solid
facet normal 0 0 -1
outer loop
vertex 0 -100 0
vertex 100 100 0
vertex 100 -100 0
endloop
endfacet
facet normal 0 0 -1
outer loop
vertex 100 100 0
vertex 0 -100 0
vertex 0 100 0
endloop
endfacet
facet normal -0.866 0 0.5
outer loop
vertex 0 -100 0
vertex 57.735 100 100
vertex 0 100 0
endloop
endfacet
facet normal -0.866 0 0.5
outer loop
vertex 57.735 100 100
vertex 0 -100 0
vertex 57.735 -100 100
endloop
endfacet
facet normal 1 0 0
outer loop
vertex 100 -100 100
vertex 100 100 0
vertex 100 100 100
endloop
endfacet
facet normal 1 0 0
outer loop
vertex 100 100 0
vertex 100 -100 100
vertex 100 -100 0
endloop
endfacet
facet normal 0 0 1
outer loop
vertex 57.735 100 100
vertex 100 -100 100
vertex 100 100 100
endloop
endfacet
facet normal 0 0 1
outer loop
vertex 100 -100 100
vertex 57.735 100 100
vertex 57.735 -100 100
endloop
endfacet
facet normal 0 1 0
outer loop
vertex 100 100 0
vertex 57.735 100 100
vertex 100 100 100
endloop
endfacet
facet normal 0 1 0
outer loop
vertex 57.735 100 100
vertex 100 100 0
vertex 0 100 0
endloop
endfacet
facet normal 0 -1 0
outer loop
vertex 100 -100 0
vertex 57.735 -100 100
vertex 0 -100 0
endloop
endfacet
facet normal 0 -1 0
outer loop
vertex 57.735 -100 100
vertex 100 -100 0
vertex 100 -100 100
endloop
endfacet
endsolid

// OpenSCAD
// file: config.scad
$fa = $preview ? 12 : 1;
$fs = $preview ? 2 : 0.4;

choc_key_x = 18;
choc_key_y = 17;
pcbAndHotswapThikness = 3;
caseThikness = 2.5;
wallOffsetFromPcb = 1;
wallOffsetFromConnector = 3;
tentingAngle = 60;
keysThikness = 11;
caseColor = "grey";
pcbColor = "darkgreen";
keysColor = "white";
screwBumpSize = 2.5;

niceNanoCutoutDepth = 8;
switchPlateCutout = 13.8;
switchPlateCutoutDepth = 2.2;
extensionWidth = 60 + (caseThikness + wallOffsetFromPcb) * 2;
extensionLength = 90;
extensionShift = 11 - caseThikness - wallOffsetFromPcb;
pcbWidth = 90;
cutter = 400;

ccFarWall = 120;
ccFrontWall = 5 + caseThikness;
ccBackWall = 58 + ccFrontWall + caseThikness;

magnetStripeWidth = 26;
magnetStripeDepth = 0.7;
// legs
legRubberDepth = 1;
legRubberDiameter = 8;
legsInsideDepth = caseThikness;
legsTotalThickness = caseThikness + legsInsideDepth + legRubberDepth;

// case to case mounting
screwHoleDiameter = 2.3;
// main file
include <../library/config.scad>;
use <../library/lib.scad>;

vPcb = [[ "r", [ 0, 180 - tentingAngle, 0 ] ]];
vTable = [];

cut3d([ vPcb, vTable ]) cube(200, center = true);
